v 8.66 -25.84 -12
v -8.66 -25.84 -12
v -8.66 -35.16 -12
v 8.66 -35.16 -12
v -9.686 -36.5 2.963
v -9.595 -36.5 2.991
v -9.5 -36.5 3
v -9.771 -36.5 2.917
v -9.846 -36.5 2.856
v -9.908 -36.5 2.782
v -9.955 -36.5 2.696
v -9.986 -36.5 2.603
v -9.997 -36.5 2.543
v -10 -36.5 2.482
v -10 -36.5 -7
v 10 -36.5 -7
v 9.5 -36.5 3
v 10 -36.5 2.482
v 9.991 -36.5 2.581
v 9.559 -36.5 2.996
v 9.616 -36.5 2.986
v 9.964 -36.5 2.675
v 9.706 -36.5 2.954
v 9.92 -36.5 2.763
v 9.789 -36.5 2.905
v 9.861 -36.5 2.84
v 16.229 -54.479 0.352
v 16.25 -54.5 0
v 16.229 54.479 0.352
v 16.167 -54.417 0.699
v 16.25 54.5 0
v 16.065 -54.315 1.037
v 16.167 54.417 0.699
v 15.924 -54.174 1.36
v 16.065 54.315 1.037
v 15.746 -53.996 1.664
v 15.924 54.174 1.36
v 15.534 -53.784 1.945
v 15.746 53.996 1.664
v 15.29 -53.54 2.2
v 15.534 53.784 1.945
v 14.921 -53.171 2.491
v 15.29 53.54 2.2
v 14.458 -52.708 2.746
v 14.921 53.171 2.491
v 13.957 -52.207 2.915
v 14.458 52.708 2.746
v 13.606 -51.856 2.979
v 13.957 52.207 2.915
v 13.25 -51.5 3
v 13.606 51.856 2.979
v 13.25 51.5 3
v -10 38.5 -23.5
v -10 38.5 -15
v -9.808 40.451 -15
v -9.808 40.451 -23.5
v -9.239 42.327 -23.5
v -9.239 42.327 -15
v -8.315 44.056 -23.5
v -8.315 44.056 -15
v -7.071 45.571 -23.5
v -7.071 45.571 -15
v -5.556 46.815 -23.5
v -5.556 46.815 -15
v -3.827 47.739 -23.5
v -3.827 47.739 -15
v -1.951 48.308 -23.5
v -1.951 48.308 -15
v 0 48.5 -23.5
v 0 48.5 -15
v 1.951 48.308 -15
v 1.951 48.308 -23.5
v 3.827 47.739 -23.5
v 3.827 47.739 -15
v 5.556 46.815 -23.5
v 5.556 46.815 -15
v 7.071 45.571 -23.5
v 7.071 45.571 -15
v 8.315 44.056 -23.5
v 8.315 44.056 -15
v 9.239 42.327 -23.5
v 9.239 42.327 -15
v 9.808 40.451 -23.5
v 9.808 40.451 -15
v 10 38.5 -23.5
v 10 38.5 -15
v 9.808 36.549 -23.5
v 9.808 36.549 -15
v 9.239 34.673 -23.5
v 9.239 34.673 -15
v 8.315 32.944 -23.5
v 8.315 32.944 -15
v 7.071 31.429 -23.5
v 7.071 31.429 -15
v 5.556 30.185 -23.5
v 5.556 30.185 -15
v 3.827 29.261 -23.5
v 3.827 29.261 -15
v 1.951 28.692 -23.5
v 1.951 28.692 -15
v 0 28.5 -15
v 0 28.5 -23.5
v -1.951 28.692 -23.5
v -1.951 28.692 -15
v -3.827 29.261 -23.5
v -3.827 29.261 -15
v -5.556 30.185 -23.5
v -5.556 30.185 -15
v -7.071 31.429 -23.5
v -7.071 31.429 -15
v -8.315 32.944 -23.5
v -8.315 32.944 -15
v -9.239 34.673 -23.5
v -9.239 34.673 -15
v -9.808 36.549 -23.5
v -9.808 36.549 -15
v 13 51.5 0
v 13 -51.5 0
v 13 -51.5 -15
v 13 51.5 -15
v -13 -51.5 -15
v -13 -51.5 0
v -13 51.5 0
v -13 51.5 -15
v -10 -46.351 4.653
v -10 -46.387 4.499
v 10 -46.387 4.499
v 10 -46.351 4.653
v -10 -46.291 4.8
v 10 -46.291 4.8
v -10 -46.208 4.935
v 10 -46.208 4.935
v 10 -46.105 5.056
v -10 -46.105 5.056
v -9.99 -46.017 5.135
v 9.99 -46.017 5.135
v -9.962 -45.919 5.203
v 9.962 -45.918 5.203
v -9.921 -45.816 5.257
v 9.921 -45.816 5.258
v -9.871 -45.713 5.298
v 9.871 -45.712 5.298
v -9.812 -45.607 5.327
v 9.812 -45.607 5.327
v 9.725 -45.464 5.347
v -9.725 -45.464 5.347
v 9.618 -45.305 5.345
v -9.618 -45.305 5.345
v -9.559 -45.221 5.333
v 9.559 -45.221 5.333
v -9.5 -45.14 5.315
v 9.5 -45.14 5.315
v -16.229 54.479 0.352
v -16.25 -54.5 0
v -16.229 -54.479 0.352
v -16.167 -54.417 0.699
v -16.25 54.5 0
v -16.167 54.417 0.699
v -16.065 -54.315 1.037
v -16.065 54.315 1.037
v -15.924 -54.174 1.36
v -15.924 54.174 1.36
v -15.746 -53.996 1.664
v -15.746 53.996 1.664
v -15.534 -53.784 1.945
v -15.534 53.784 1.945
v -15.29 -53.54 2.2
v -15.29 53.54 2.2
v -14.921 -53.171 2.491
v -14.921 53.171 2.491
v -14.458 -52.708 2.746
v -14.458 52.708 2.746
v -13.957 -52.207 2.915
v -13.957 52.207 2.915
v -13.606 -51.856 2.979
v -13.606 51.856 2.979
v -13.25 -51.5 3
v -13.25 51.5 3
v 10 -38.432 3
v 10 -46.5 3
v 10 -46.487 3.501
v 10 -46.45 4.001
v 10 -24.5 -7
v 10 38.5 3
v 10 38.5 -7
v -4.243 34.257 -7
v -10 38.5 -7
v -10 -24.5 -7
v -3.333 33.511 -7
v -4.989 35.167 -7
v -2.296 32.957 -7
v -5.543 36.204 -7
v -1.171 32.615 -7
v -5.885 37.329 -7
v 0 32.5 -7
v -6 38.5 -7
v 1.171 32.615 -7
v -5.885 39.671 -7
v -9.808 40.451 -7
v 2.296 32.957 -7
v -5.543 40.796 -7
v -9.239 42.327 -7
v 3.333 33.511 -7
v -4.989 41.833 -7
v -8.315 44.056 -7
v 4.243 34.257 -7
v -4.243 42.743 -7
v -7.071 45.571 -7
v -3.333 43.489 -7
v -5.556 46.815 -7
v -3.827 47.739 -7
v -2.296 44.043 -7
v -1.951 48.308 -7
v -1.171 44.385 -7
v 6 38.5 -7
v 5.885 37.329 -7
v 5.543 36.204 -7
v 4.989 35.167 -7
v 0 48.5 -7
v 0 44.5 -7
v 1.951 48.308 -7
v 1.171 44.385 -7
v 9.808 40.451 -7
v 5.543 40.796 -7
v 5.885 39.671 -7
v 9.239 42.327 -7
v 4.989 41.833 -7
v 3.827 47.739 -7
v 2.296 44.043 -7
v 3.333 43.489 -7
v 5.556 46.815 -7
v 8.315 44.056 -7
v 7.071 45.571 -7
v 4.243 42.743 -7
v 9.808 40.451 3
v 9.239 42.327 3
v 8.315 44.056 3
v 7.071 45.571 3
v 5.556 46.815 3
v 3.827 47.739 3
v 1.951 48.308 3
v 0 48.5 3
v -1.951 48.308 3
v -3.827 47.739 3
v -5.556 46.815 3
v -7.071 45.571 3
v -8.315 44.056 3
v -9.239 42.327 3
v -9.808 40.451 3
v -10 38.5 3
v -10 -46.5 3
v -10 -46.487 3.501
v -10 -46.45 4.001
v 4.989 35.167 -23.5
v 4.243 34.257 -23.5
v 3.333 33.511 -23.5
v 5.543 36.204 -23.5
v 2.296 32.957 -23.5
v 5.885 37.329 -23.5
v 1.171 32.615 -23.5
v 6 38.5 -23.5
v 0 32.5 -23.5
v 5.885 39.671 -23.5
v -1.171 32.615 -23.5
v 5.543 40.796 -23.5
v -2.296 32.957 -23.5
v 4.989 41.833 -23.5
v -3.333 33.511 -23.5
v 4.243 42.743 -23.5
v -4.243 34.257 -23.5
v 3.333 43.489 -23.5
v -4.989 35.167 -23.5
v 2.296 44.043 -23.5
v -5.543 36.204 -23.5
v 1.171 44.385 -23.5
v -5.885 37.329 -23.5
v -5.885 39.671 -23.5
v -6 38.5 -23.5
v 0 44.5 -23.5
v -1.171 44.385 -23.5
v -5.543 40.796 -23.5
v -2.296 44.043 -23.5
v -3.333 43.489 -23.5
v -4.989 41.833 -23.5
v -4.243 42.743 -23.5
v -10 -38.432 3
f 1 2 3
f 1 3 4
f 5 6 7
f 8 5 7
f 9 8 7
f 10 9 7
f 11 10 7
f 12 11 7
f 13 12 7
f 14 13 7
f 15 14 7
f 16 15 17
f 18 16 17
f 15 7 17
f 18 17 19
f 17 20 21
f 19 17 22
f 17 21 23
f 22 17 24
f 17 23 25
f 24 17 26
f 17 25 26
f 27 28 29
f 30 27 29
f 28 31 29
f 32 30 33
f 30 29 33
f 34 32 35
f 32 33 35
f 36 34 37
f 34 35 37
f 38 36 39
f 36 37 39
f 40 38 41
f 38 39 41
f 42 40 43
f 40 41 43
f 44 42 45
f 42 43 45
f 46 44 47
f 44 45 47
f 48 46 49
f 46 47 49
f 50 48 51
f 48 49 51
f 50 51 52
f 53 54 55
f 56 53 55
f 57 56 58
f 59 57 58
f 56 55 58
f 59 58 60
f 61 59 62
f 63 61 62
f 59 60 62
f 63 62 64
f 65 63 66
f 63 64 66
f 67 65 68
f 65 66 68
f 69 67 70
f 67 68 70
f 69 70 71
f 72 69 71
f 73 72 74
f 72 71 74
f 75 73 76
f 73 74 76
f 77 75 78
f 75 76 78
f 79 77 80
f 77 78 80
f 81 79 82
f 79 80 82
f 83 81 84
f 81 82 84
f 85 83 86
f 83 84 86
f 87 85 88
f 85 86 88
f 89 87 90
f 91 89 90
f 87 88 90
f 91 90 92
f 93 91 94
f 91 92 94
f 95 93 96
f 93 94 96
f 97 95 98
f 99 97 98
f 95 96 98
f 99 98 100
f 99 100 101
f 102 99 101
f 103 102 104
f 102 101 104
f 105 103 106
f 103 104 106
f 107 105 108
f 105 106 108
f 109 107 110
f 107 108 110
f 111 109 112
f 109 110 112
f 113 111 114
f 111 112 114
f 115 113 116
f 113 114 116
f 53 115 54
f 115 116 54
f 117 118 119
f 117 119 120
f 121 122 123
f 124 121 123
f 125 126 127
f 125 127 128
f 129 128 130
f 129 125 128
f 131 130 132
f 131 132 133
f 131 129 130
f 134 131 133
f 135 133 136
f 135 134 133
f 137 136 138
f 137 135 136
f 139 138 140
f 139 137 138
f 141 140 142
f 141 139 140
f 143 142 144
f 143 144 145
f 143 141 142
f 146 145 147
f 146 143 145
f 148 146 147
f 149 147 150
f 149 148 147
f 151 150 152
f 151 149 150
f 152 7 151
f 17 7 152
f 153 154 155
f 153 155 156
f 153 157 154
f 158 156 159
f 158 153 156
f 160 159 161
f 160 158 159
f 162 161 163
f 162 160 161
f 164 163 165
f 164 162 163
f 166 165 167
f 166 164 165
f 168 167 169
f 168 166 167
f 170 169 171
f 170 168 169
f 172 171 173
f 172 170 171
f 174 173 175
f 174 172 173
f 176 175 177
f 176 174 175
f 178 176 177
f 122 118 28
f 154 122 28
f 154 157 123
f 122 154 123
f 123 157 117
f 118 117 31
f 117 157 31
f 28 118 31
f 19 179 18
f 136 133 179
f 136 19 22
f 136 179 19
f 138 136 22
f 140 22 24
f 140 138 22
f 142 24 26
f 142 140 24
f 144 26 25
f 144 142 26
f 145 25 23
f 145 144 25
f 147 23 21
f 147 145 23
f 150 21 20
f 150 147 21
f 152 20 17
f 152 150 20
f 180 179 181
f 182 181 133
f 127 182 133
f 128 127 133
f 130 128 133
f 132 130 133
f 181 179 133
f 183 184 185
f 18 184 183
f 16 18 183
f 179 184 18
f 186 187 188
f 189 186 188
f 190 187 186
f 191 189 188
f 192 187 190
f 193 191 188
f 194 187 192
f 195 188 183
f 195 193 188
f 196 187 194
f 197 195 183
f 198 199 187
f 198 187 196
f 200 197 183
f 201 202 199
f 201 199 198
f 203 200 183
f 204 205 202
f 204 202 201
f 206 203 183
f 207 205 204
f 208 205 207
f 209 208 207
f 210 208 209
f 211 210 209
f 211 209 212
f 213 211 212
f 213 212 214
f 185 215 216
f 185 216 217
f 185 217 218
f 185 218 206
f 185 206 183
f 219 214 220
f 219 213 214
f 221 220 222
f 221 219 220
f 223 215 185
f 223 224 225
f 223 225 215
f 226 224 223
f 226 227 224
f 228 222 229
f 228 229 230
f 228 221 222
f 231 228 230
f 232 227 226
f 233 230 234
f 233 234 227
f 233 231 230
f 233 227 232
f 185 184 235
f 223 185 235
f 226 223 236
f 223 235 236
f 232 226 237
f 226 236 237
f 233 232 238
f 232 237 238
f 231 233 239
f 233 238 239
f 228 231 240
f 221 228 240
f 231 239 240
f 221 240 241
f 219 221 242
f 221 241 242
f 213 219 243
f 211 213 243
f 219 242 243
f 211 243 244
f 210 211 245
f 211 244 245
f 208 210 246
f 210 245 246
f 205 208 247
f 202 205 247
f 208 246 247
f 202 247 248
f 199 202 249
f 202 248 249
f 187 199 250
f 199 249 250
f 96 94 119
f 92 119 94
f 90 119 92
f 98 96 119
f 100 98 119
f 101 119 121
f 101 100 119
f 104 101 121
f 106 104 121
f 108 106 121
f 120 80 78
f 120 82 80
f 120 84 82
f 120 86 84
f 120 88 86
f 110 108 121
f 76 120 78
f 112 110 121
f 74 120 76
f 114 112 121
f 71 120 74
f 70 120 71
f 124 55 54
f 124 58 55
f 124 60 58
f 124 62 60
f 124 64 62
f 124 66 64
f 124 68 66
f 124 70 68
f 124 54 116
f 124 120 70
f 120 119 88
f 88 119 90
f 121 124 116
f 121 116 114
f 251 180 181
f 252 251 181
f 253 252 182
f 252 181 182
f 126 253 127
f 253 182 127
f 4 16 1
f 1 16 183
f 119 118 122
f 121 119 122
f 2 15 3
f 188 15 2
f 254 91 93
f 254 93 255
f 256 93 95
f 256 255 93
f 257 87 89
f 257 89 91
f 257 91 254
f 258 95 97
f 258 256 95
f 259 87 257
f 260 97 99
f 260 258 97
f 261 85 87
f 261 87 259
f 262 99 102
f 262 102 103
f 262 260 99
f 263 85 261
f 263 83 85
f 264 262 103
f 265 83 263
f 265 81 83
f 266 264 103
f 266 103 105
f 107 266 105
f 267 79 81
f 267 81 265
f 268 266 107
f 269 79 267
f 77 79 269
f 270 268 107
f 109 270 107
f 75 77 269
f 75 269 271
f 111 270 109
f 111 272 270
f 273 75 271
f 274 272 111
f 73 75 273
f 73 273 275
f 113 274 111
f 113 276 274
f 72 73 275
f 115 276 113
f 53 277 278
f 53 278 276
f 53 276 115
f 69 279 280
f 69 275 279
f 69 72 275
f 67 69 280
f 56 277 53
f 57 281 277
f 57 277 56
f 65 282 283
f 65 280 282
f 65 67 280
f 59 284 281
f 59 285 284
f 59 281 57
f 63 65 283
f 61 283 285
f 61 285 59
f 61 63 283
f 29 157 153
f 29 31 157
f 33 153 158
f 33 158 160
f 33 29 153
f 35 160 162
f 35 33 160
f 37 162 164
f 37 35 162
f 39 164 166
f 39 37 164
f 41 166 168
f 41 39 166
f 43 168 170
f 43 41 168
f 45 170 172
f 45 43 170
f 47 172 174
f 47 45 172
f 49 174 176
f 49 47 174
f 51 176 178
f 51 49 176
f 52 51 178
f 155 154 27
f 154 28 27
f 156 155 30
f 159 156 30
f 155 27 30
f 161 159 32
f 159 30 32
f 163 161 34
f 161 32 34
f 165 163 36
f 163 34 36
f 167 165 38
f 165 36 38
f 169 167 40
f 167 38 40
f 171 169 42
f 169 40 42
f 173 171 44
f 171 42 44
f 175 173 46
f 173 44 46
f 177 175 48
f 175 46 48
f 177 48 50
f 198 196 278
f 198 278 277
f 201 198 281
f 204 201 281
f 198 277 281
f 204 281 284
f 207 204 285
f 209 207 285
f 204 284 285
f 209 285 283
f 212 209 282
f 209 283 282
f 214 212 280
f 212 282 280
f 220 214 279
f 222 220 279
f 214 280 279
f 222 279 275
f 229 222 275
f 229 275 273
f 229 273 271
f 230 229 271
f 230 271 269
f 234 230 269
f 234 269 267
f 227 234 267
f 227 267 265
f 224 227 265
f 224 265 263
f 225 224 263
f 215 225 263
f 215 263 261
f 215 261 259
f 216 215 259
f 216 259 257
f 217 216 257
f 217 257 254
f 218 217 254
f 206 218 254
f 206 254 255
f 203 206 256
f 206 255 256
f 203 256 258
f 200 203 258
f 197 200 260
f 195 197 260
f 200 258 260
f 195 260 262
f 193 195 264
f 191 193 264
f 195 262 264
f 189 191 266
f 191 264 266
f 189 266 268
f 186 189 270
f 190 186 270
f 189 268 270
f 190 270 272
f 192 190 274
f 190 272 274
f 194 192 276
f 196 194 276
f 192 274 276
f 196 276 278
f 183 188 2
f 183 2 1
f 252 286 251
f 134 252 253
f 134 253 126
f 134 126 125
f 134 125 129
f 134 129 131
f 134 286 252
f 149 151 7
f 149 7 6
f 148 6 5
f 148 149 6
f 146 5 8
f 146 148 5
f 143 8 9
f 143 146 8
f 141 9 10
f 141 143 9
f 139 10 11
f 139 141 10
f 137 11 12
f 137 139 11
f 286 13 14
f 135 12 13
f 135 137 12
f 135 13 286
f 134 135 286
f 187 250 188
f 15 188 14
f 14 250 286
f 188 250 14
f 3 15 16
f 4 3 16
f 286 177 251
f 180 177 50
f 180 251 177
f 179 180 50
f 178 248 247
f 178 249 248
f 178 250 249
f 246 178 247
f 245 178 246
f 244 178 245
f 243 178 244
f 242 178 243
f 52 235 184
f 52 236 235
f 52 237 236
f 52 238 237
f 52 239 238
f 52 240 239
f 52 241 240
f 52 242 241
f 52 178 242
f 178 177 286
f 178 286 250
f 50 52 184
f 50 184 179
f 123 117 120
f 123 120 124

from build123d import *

# Parameters (mm, degrees)
SKETCH_1_W          = 32.5
SKETCH_1_H          = 109
EXTRUDE_1_DEPTH     = 3
FILLET_2_R          = 3
SKETCH_2_W          = 26
SKETCH_2_H          = 103
EXTRUDE_2_DEPTH     = 15
SKETCH_4_R          = 10
EXTRUDE_3_DEPTH     = 8.5
CUT_EXTRUDE_1_DEPTH = 10
SKETCH_6_W          = 20
SKETCH_6_H          = 12
CUT_EXTRUDE_2_DEPTH = 5
CUT_EXTRUDE_2_DRAFT = -15
SKETCH_7_W          = 20
SKETCH_7_H          = 10
REVOLVE_1_ANGLE     = 15
FILLET_START        = -47
FILLET_3_DEPTH      = 12
FILLET_START_2      = -11
FILLET_3_2_DEPTH    = 22
SKETCH_8_R          = 6
CUT_EXTRUDE_3_DEPTH = 64.76973092


with BuildPart() as part:
    # 草圖1 → 伸長1 (new body)
    with BuildSketch(Plane.XY):
        Rectangle(SKETCH_1_W, SKETCH_1_H)
    extrude(amount=EXTRUDE_1_DEPTH)

    # 圓角2
    fillet_2_edges = [part.edges().sort_by_distance(p)[0] for p in [
        (-16.25, 0, 3),
        (16.25, 0, 3),
        (0, -54.5, 3),
        (0, 54.5, 3),
    ]]
    fillet(fillet_2_edges, radius=FILLET_2_R - 0.0001)  # a hair under: the kernel refuses the full size

    # 草圖2 → 伸長2 (add)
    with BuildSketch(Plane(origin=(0, 0, 0), x_dir=(-1, 0, 0), z_dir=(0, 0, -1))):
        Rectangle(SKETCH_2_W, SKETCH_2_H)
    extrude(amount=EXTRUDE_2_DEPTH)

    # 草圖4 → 伸長3 (add)
    with BuildSketch(Plane(origin=(0, 0, -15), x_dir=(-1, 0, 0), z_dir=(0, 0, -1))):
        with Locations((0, 38.5)):
            Circle(SKETCH_4_R)
    extrude(amount=EXTRUDE_3_DEPTH)

    # 草圖5 → 除料-伸長1 (cut)
    with BuildSketch(Plane.XY.offset(3)):
        with BuildLine():
            Line((-10, 38.5), (-10, -36.5))
            Line((-10, -36.5), (10, -36.5))
            Line((10, -36.5), (10, 38.5))
            ThreePointArc((10, 38.5), (0, 48.5), (-10, 38.5))
        make_face()
    extrude(amount=-CUT_EXTRUDE_1_DEPTH, mode=Mode.SUBTRACT)


with BuildPart() as cut_extrude_2_tool:
    # 草圖6 → 除料-伸長2 (with draft: the straight prism first)
    with BuildSketch(Plane.XY.offset(-7)):
        with Locations((0, -30.5)):
            Rectangle(SKETCH_6_W, SKETCH_6_H)
    extrude(amount=-CUT_EXTRUDE_2_DEPTH)
    # 除料-伸長2: the draft: its side faces are tilted about the plane it starts from
    cut_extrude_2_sides = [cut_extrude_2_tool.faces().sort_by_distance(p)[0] for p in [
        (0, -36.5, -9.5),
        (10, -30.5, -9.5),
        (0, -24.5, -9.5),
        (-10, -30.5, -9.5),
    ]]
    draft(cut_extrude_2_sides, Plane.XY.offset(-7), CUT_EXTRUDE_2_DRAFT)


with BuildPart() as part_1:
    add(part.part)

    # 除料-伸長2: cut by cut_extrude_2_tool
    add(cut_extrude_2_tool.part, mode=Mode.SUBTRACT)

    # 草圖7 → 旋轉1 (revolve)
    with BuildSketch(Plane.XY.offset(3)):
        with Locations((0, -41.5)):
            Rectangle(SKETCH_7_W, SKETCH_7_H)
    revolve(axis=Axis((-10, -36.5, 3), (-1, 0, 0)), revolution_arc=REVOLVE_1_ANGLE)

    # 圓角3: read off the stored shape, not the designer's step
    # 圓角3 outline → 圓角3 (cut)
    with BuildSketch(Plane(origin=(0, 0, 0), x_dir=(1, 0, 0), z_dir=(0, 0.9659258262890682, -0.2588190451025211)).offset(FILLET_START)):
        with BuildLine():
            ThreePointArc((10, 7.049117667), (9.853553391, 6.695564276), (9.5, 6.549117667))
            Line((9.5, 6.549117667), (10, 6.549117667))
            Line((10, 6.549117667), (10, 7.049117667))
        make_face()
        with BuildLine():
            ThreePointArc((-9.5, 6.549117667), (-9.853553391, 6.695564276), (-10, 7.049117667))
            Line((-10, 7.049117667), (-10, 6.549117667))
            Line((-10, 6.549117667), (-9.5, 6.549117667))
        make_face()
    extrude(amount=FILLET_3_DEPTH, mode=Mode.SUBTRACT)

    # Fillet 3 2 outline → Fillet 3 2 (cut)
    with BuildSketch(Plane.YZ.offset(FILLET_START_2)):
        with BuildLine():
            ThreePointArc((-46.387024756, 4.498913432), (-45.945734853, 5.185884966), (-45.139503235, 5.314947915))
            Line((-45.139503235, 5.314947915), (-46.159258263, 5.588190451))
            ThreePointArc((-46.159258263, 5.588190451), (-46.288305577, 5.04672273), (-46.387024756, 4.498913432))
        make_face()
    extrude(amount=FILLET_3_2_DEPTH, mode=Mode.SUBTRACT)

    # 草圖8 → 除料-伸長3 (cut, through all)
    with BuildSketch(Plane(origin=(0, 0, -23.5), x_dir=(-1, 0, 0), z_dir=(0, 0, -1))):
        with Locations((0, 38.5)):
            Circle(SKETCH_8_R)
    extrude(amount=-CUT_EXTRUDE_3_DEPTH, mode=Mode.SUBTRACT)


solid = part_1.part
